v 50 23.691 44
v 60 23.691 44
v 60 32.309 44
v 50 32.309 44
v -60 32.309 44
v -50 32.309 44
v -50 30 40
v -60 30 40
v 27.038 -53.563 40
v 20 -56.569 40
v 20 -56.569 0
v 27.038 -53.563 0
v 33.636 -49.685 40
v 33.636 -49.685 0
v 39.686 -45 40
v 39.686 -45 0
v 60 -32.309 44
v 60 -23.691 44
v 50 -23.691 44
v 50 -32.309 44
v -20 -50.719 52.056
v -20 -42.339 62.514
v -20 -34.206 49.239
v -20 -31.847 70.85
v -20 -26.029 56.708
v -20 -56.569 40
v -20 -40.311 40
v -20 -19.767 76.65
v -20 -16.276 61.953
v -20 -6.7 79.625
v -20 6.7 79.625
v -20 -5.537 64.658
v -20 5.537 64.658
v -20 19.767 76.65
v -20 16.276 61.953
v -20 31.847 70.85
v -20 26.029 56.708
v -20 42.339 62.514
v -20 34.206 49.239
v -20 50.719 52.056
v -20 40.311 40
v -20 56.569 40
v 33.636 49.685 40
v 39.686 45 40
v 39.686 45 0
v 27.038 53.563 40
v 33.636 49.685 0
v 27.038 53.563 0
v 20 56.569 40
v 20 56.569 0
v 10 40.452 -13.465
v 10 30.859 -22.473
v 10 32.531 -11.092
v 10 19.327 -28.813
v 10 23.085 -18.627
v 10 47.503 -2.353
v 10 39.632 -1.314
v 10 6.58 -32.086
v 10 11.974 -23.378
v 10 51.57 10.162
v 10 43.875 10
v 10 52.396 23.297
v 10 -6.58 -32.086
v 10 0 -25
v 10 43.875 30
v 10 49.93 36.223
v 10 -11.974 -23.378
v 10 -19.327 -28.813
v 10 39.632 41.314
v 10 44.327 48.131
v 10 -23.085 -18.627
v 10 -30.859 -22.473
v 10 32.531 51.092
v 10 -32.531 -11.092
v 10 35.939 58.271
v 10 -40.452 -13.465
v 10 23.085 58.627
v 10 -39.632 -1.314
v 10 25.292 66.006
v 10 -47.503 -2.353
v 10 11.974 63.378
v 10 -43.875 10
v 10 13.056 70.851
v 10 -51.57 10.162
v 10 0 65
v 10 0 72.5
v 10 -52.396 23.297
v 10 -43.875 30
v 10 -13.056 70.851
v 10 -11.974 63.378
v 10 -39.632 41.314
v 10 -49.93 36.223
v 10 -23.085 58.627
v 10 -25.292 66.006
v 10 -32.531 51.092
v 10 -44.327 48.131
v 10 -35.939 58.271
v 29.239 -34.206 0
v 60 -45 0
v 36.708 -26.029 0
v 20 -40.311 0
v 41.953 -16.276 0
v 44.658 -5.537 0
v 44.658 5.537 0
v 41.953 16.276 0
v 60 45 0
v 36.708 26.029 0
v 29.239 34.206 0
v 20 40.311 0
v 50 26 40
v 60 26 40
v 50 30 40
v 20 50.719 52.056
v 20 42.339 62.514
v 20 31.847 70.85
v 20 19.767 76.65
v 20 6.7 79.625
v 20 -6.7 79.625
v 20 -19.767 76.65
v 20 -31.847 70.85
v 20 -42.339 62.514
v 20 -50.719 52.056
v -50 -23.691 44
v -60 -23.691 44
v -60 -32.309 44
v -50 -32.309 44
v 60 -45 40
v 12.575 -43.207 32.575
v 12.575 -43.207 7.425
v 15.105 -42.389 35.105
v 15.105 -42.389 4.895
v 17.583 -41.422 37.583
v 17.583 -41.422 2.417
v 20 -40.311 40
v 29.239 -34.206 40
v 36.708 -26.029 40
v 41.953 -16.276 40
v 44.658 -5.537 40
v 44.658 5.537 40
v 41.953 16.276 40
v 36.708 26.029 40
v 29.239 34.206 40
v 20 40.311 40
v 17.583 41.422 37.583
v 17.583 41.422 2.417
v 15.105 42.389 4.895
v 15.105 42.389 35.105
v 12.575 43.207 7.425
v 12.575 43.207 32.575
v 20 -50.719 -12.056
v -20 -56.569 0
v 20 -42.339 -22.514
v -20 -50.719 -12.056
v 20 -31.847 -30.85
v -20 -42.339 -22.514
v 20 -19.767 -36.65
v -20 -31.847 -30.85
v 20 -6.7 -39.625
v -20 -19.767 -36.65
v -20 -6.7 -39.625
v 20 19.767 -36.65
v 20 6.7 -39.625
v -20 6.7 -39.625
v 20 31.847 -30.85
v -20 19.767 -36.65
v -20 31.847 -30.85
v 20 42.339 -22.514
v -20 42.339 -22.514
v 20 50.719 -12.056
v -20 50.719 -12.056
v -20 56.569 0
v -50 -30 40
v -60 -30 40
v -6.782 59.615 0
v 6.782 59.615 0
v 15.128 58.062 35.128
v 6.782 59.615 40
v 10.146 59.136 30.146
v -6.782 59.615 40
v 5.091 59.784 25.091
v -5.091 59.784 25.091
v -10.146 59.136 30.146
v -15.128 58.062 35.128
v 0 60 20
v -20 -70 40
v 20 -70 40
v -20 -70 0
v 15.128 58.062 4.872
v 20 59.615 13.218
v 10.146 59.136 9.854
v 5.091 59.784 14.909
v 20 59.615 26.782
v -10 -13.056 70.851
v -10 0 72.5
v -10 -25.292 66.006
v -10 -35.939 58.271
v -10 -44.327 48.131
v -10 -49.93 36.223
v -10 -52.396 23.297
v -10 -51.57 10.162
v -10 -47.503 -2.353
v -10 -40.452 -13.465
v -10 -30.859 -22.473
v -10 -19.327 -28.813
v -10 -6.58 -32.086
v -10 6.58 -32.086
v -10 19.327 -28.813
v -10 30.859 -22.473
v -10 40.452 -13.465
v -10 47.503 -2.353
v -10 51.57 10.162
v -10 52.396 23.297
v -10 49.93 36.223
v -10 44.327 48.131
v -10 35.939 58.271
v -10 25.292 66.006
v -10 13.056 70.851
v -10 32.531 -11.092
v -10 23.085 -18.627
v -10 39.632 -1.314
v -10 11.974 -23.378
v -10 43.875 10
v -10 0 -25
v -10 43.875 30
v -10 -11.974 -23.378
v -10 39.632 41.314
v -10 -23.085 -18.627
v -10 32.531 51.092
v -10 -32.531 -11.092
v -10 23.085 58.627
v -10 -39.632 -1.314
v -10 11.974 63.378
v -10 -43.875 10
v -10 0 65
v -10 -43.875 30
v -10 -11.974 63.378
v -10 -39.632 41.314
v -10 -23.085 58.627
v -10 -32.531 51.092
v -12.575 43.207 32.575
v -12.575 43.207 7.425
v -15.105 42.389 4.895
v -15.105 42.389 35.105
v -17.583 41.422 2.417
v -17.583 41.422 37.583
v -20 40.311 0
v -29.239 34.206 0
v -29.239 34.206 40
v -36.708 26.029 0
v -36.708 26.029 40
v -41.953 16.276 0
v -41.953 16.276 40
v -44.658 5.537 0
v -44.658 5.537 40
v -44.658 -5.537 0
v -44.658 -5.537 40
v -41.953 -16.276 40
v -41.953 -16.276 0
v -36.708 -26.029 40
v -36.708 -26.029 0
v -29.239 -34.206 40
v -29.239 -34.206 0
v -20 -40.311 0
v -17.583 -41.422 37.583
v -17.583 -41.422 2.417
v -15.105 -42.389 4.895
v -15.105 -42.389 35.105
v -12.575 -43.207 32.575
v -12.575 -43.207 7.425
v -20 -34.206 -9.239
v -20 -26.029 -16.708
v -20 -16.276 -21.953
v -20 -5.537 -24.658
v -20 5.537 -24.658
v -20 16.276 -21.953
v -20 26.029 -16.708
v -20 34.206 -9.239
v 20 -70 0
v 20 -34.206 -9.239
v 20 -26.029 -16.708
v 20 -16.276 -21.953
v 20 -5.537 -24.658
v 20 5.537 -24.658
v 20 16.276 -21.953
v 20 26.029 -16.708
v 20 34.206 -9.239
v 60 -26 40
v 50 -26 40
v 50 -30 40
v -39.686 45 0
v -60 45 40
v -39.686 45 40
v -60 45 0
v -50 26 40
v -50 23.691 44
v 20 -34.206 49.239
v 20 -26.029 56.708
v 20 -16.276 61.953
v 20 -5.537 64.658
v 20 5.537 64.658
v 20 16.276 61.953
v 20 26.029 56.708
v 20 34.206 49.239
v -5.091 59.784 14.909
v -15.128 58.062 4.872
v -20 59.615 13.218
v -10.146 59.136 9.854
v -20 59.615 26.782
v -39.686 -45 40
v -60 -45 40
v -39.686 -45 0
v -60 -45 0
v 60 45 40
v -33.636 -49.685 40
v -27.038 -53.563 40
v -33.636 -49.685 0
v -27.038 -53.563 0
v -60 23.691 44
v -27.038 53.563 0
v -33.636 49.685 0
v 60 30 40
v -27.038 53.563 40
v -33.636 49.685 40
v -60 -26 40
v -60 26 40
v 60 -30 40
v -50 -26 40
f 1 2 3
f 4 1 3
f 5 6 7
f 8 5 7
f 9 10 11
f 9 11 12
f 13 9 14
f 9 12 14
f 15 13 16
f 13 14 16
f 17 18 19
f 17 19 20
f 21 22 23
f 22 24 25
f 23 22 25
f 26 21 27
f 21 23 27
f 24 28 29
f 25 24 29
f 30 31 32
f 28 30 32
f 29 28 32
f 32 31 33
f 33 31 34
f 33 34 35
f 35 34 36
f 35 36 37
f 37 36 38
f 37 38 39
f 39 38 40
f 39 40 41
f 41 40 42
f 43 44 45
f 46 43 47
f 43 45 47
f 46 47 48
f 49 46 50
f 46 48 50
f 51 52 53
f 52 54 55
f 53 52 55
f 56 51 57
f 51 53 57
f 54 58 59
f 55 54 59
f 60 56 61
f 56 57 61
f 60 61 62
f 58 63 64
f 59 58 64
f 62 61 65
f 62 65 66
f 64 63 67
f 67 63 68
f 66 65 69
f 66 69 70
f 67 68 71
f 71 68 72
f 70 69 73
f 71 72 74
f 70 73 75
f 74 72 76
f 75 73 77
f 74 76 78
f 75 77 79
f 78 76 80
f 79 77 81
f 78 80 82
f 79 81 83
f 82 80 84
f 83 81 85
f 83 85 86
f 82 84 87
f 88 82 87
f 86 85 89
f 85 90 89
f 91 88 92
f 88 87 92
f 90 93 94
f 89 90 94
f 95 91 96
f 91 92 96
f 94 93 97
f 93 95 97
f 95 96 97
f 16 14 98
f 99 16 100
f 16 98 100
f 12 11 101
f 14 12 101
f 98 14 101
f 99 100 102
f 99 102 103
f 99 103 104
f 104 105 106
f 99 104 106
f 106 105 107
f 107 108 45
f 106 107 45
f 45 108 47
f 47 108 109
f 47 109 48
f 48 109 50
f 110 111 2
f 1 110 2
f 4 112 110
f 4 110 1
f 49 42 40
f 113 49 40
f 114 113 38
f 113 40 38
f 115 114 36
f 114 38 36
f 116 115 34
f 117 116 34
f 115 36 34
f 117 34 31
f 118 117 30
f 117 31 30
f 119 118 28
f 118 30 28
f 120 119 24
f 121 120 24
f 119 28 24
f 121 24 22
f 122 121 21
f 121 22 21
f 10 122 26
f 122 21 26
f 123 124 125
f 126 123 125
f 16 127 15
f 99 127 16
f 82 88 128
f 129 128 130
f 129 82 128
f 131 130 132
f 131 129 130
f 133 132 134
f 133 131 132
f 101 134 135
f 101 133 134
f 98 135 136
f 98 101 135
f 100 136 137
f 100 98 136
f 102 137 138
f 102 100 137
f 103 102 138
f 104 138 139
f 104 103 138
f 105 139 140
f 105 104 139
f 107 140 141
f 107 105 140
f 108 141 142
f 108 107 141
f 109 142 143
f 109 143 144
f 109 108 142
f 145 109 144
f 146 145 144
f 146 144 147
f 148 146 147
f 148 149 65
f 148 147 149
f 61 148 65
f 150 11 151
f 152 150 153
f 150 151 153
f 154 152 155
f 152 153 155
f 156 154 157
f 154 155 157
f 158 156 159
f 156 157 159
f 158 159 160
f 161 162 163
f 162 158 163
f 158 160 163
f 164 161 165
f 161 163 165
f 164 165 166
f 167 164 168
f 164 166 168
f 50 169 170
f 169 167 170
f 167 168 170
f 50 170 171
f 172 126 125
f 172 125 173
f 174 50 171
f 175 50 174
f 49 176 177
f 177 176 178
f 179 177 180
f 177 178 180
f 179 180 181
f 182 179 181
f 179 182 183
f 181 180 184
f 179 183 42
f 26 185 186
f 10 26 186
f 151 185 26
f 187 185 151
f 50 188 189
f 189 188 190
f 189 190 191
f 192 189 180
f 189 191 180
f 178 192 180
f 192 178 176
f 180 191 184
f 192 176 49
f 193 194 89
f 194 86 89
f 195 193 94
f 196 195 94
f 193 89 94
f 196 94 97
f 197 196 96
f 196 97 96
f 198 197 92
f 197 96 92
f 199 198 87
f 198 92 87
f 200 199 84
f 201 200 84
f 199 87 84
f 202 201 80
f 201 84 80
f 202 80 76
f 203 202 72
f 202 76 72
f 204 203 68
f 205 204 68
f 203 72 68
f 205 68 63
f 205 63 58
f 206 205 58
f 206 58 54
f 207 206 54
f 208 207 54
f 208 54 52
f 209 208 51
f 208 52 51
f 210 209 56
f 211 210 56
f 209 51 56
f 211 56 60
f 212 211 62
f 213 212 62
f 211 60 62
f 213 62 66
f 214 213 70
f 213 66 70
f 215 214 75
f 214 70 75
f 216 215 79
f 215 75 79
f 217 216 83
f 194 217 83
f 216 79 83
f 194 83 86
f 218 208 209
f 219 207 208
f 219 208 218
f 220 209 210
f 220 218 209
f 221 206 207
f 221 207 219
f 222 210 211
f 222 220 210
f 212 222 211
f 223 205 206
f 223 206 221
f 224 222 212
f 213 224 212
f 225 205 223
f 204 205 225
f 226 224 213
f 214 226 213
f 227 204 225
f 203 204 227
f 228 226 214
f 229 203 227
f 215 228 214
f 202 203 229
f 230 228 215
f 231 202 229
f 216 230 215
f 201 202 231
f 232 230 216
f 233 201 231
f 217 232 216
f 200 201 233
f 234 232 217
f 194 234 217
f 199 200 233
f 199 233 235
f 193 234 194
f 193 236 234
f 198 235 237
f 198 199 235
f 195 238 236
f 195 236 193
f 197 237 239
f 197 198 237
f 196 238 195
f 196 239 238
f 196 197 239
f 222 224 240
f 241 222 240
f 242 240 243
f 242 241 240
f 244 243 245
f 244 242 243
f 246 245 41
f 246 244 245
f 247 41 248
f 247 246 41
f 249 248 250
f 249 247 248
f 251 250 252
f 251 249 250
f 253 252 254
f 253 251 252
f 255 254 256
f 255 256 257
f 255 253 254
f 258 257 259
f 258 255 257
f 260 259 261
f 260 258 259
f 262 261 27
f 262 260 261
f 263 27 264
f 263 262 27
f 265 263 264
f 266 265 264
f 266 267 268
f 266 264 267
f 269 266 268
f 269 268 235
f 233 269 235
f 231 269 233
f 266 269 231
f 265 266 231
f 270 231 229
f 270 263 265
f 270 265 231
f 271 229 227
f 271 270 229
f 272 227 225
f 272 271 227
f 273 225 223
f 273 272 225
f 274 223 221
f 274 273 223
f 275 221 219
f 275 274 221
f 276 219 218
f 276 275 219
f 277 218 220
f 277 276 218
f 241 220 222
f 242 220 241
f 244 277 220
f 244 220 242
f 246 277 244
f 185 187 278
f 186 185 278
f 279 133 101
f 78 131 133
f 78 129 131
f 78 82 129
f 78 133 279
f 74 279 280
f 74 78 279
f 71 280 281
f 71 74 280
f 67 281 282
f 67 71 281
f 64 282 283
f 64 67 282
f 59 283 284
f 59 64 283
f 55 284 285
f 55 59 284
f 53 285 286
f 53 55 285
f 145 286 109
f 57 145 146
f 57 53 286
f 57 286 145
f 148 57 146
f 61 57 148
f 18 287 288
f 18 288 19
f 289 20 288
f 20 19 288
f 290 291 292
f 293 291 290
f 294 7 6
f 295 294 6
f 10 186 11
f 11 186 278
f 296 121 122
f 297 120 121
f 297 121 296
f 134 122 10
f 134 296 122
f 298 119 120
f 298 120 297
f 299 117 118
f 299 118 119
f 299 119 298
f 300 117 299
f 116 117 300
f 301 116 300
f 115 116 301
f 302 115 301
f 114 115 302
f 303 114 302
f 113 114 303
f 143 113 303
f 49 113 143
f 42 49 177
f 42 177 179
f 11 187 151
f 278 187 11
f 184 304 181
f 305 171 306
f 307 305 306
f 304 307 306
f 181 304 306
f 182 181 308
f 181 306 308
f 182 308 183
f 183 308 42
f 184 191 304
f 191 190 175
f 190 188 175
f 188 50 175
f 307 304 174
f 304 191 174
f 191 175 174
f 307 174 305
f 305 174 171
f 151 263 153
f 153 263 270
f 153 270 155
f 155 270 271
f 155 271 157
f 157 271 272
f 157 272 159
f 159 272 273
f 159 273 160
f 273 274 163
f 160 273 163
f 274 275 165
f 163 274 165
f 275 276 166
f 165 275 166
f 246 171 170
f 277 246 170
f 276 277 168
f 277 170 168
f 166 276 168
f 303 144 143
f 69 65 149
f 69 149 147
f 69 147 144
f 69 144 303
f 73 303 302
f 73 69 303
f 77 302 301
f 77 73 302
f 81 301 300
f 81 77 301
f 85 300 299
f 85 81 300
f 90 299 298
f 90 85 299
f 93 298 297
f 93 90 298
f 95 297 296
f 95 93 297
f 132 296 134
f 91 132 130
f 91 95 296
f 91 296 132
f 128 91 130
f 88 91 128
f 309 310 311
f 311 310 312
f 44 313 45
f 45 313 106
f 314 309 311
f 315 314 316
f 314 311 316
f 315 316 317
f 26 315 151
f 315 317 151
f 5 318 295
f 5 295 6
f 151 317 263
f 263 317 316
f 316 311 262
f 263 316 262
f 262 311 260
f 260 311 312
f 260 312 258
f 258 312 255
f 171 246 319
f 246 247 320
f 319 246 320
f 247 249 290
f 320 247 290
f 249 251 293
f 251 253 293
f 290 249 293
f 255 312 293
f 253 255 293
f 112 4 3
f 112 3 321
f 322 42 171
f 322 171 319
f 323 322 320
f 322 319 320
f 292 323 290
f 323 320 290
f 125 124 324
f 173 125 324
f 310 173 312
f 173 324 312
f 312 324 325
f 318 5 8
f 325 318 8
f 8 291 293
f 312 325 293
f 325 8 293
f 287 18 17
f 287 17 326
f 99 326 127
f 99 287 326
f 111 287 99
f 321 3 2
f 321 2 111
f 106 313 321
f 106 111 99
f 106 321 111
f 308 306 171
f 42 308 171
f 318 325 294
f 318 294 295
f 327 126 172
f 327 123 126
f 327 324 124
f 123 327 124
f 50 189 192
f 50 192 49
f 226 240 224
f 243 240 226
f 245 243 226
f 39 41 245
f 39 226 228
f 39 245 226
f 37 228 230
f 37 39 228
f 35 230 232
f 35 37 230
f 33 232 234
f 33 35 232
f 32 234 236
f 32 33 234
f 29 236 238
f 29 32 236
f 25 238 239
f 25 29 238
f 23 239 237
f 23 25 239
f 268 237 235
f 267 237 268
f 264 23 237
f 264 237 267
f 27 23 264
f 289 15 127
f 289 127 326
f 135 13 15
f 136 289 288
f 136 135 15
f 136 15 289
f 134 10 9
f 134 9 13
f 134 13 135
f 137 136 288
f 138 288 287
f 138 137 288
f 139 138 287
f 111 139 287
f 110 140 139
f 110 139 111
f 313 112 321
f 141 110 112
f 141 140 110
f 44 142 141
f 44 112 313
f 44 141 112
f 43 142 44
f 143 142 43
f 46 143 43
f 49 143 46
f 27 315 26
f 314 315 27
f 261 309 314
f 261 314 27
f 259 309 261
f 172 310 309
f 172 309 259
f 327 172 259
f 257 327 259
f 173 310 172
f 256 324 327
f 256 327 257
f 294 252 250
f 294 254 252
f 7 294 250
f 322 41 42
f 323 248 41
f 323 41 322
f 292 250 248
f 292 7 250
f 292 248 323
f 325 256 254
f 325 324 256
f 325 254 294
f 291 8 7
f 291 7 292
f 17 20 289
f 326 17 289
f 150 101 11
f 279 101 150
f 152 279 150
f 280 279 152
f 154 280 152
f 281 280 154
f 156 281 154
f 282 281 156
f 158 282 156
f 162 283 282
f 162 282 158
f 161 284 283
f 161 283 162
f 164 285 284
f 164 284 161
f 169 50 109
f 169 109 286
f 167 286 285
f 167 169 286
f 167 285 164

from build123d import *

# Parameters (mm, degrees)
ESQUISSE1_R                  = 60
ESQUISSE1_R_2                = 45
BOSS_EXTRU_1_DEPTH           = 40
BOSS_EXTRU_3_REACH           = 142
BOSS_EXTRU_3_END_RADIUS      = 60
ESQUISSE5_W                  = 40
ESQUISSE5_H                  = 90
BOSS_EXTRU_4_DEPTH           = 10
R_P_TITION_CIRCULAIRE1_COUNT = 2
R_P_TITION_CIRCULAIRE1_ANGLE = 90
ESQUISSE11_W                 = 20
ESQUISSE11_H                 = 15
BOSS_EXTRU_7_REACH           = 166.012
ESQUISSE17_W                 = 40
ESQUISSE17_H                 = 40


with BuildPart() as part:
    # Esquisse1 → Boss.-Extru.1 (new body)
    with BuildSketch(Plane.XY):
        Circle(ESQUISSE1_R)
        Circle(ESQUISSE1_R_2, mode=Mode.SUBTRACT)
    boss_extru_1 = extrude(amount=BOSS_EXTRU_1_DEPTH)

    # Boss.-Extru.3: up to this cylinder (the profile starts outside it)
    boss_extru_3_end = Plane(origin=(0, 0, 20), z_dir=(0, 0, -1)) * Cylinder(BOSS_EXTRU_3_END_RADIUS, 405, mode=Mode.PRIVATE)
    # Esquisse5 → Boss.-Extru.3 (add, up to the surface)
    with BuildSketch(Plane(origin=(60, 0, 0), x_dir=(0, 0, -1), z_dir=(1, 0, 0)), mode=Mode.PRIVATE) as boss_extru_3_sk1:
        with Locations((-20, 0)):
            Rectangle(ESQUISSE5_W, ESQUISSE5_H)
    boss_extru_3_tool1 = extrude(boss_extru_3_sk1.sketch, amount=-BOSS_EXTRU_3_REACH, mode=Mode.PRIVATE) - boss_extru_3_end
    boss_extru_3 = boss_extru_3_tool1.solids().sort_by_distance((60, 0, 20))[0] + boss_extru_3_tool1.solids().sort_by_distance((60, 0, 20))[1]
    add(boss_extru_3)

    # Symétrie2: Boss.-Extru.3 across plane
    add(boss_extru_3.mirror(Plane(origin=(0, 0, 0), x_dir=(0, 0, 1), z_dir=(1, 0, 0))))

    # Esquisse7 → Boss.-Extru.4 (add)
    with BuildSketch(Plane(origin=(60, 0, 0), x_dir=(0, 0, -1), z_dir=(1, 0, 0))):
        Polygon((-40, 30), (-40, 26), (-44, 23.690598923), (-44, 32.309401077), align=None)
        Polygon((-44, -32.309401077), (-40, -30), (-40, -26), (-44, -23.690598923), align=None)
    boss_extru_4 = extrude(amount=-BOSS_EXTRU_4_DEPTH)

    # Symétrie3: Boss.-Extru.4 across plane
    add(boss_extru_4.mirror(Plane(origin=(0, 0, 0), x_dir=(0, 0, 1), z_dir=(1, 0, 0))))

    # Répétition circulaire1: Boss.-Extru.1 ×2 about axis
    r_p_tition_circulaire1_axis = Axis((0, -67.301071144, 20), (0, 1, 0))
    for i in range(1, R_P_TITION_CIRCULAIRE1_COUNT):
        add(boss_extru_1.rotate(r_p_tition_circulaire1_axis, i * R_P_TITION_CIRCULAIRE1_ANGLE / (R_P_TITION_CIRCULAIRE1_COUNT - 1)))

    # Esquisse11 → Enlèvement de matière-Révolution3 (revolve, cut)
    with BuildSketch(Plane.XY.offset(20), mode=Mode.PRIVATE) as enl_vement_de_mati_re_r_volution3_sk:
        with Locations((0, -45)):
            Rectangle(ESQUISSE11_W, ESQUISSE11_H)
    revolve(enl_vement_de_mati_re_r_volution3_sk.sketch.rotate(Axis((-20, 0, 20), (1, 0, 0)), 270), axis=Axis((-20, 0, 20), (1, 0, 0)), mode=Mode.SUBTRACT)

    # Esquisse17 → Boss.-Extru.7 (add, up to next)
    with BuildSketch(Plane(origin=(0, -70, 0), x_dir=(1, 0, 0), z_dir=(0, 1, 0)), mode=Mode.PRIVATE) as boss_extru_7_sk1:
        with Locations((0, -20)):
            Rectangle(ESQUISSE17_W, ESQUISSE17_H)
    boss_extru_7_tool1 = extrude(boss_extru_7_sk1.sketch, amount=BOSS_EXTRU_7_REACH, mode=Mode.PRIVATE) - part.part
    add(boss_extru_7_tool1.solids().sort_by_distance((0, -70, 20))[0])


solid = part.part
